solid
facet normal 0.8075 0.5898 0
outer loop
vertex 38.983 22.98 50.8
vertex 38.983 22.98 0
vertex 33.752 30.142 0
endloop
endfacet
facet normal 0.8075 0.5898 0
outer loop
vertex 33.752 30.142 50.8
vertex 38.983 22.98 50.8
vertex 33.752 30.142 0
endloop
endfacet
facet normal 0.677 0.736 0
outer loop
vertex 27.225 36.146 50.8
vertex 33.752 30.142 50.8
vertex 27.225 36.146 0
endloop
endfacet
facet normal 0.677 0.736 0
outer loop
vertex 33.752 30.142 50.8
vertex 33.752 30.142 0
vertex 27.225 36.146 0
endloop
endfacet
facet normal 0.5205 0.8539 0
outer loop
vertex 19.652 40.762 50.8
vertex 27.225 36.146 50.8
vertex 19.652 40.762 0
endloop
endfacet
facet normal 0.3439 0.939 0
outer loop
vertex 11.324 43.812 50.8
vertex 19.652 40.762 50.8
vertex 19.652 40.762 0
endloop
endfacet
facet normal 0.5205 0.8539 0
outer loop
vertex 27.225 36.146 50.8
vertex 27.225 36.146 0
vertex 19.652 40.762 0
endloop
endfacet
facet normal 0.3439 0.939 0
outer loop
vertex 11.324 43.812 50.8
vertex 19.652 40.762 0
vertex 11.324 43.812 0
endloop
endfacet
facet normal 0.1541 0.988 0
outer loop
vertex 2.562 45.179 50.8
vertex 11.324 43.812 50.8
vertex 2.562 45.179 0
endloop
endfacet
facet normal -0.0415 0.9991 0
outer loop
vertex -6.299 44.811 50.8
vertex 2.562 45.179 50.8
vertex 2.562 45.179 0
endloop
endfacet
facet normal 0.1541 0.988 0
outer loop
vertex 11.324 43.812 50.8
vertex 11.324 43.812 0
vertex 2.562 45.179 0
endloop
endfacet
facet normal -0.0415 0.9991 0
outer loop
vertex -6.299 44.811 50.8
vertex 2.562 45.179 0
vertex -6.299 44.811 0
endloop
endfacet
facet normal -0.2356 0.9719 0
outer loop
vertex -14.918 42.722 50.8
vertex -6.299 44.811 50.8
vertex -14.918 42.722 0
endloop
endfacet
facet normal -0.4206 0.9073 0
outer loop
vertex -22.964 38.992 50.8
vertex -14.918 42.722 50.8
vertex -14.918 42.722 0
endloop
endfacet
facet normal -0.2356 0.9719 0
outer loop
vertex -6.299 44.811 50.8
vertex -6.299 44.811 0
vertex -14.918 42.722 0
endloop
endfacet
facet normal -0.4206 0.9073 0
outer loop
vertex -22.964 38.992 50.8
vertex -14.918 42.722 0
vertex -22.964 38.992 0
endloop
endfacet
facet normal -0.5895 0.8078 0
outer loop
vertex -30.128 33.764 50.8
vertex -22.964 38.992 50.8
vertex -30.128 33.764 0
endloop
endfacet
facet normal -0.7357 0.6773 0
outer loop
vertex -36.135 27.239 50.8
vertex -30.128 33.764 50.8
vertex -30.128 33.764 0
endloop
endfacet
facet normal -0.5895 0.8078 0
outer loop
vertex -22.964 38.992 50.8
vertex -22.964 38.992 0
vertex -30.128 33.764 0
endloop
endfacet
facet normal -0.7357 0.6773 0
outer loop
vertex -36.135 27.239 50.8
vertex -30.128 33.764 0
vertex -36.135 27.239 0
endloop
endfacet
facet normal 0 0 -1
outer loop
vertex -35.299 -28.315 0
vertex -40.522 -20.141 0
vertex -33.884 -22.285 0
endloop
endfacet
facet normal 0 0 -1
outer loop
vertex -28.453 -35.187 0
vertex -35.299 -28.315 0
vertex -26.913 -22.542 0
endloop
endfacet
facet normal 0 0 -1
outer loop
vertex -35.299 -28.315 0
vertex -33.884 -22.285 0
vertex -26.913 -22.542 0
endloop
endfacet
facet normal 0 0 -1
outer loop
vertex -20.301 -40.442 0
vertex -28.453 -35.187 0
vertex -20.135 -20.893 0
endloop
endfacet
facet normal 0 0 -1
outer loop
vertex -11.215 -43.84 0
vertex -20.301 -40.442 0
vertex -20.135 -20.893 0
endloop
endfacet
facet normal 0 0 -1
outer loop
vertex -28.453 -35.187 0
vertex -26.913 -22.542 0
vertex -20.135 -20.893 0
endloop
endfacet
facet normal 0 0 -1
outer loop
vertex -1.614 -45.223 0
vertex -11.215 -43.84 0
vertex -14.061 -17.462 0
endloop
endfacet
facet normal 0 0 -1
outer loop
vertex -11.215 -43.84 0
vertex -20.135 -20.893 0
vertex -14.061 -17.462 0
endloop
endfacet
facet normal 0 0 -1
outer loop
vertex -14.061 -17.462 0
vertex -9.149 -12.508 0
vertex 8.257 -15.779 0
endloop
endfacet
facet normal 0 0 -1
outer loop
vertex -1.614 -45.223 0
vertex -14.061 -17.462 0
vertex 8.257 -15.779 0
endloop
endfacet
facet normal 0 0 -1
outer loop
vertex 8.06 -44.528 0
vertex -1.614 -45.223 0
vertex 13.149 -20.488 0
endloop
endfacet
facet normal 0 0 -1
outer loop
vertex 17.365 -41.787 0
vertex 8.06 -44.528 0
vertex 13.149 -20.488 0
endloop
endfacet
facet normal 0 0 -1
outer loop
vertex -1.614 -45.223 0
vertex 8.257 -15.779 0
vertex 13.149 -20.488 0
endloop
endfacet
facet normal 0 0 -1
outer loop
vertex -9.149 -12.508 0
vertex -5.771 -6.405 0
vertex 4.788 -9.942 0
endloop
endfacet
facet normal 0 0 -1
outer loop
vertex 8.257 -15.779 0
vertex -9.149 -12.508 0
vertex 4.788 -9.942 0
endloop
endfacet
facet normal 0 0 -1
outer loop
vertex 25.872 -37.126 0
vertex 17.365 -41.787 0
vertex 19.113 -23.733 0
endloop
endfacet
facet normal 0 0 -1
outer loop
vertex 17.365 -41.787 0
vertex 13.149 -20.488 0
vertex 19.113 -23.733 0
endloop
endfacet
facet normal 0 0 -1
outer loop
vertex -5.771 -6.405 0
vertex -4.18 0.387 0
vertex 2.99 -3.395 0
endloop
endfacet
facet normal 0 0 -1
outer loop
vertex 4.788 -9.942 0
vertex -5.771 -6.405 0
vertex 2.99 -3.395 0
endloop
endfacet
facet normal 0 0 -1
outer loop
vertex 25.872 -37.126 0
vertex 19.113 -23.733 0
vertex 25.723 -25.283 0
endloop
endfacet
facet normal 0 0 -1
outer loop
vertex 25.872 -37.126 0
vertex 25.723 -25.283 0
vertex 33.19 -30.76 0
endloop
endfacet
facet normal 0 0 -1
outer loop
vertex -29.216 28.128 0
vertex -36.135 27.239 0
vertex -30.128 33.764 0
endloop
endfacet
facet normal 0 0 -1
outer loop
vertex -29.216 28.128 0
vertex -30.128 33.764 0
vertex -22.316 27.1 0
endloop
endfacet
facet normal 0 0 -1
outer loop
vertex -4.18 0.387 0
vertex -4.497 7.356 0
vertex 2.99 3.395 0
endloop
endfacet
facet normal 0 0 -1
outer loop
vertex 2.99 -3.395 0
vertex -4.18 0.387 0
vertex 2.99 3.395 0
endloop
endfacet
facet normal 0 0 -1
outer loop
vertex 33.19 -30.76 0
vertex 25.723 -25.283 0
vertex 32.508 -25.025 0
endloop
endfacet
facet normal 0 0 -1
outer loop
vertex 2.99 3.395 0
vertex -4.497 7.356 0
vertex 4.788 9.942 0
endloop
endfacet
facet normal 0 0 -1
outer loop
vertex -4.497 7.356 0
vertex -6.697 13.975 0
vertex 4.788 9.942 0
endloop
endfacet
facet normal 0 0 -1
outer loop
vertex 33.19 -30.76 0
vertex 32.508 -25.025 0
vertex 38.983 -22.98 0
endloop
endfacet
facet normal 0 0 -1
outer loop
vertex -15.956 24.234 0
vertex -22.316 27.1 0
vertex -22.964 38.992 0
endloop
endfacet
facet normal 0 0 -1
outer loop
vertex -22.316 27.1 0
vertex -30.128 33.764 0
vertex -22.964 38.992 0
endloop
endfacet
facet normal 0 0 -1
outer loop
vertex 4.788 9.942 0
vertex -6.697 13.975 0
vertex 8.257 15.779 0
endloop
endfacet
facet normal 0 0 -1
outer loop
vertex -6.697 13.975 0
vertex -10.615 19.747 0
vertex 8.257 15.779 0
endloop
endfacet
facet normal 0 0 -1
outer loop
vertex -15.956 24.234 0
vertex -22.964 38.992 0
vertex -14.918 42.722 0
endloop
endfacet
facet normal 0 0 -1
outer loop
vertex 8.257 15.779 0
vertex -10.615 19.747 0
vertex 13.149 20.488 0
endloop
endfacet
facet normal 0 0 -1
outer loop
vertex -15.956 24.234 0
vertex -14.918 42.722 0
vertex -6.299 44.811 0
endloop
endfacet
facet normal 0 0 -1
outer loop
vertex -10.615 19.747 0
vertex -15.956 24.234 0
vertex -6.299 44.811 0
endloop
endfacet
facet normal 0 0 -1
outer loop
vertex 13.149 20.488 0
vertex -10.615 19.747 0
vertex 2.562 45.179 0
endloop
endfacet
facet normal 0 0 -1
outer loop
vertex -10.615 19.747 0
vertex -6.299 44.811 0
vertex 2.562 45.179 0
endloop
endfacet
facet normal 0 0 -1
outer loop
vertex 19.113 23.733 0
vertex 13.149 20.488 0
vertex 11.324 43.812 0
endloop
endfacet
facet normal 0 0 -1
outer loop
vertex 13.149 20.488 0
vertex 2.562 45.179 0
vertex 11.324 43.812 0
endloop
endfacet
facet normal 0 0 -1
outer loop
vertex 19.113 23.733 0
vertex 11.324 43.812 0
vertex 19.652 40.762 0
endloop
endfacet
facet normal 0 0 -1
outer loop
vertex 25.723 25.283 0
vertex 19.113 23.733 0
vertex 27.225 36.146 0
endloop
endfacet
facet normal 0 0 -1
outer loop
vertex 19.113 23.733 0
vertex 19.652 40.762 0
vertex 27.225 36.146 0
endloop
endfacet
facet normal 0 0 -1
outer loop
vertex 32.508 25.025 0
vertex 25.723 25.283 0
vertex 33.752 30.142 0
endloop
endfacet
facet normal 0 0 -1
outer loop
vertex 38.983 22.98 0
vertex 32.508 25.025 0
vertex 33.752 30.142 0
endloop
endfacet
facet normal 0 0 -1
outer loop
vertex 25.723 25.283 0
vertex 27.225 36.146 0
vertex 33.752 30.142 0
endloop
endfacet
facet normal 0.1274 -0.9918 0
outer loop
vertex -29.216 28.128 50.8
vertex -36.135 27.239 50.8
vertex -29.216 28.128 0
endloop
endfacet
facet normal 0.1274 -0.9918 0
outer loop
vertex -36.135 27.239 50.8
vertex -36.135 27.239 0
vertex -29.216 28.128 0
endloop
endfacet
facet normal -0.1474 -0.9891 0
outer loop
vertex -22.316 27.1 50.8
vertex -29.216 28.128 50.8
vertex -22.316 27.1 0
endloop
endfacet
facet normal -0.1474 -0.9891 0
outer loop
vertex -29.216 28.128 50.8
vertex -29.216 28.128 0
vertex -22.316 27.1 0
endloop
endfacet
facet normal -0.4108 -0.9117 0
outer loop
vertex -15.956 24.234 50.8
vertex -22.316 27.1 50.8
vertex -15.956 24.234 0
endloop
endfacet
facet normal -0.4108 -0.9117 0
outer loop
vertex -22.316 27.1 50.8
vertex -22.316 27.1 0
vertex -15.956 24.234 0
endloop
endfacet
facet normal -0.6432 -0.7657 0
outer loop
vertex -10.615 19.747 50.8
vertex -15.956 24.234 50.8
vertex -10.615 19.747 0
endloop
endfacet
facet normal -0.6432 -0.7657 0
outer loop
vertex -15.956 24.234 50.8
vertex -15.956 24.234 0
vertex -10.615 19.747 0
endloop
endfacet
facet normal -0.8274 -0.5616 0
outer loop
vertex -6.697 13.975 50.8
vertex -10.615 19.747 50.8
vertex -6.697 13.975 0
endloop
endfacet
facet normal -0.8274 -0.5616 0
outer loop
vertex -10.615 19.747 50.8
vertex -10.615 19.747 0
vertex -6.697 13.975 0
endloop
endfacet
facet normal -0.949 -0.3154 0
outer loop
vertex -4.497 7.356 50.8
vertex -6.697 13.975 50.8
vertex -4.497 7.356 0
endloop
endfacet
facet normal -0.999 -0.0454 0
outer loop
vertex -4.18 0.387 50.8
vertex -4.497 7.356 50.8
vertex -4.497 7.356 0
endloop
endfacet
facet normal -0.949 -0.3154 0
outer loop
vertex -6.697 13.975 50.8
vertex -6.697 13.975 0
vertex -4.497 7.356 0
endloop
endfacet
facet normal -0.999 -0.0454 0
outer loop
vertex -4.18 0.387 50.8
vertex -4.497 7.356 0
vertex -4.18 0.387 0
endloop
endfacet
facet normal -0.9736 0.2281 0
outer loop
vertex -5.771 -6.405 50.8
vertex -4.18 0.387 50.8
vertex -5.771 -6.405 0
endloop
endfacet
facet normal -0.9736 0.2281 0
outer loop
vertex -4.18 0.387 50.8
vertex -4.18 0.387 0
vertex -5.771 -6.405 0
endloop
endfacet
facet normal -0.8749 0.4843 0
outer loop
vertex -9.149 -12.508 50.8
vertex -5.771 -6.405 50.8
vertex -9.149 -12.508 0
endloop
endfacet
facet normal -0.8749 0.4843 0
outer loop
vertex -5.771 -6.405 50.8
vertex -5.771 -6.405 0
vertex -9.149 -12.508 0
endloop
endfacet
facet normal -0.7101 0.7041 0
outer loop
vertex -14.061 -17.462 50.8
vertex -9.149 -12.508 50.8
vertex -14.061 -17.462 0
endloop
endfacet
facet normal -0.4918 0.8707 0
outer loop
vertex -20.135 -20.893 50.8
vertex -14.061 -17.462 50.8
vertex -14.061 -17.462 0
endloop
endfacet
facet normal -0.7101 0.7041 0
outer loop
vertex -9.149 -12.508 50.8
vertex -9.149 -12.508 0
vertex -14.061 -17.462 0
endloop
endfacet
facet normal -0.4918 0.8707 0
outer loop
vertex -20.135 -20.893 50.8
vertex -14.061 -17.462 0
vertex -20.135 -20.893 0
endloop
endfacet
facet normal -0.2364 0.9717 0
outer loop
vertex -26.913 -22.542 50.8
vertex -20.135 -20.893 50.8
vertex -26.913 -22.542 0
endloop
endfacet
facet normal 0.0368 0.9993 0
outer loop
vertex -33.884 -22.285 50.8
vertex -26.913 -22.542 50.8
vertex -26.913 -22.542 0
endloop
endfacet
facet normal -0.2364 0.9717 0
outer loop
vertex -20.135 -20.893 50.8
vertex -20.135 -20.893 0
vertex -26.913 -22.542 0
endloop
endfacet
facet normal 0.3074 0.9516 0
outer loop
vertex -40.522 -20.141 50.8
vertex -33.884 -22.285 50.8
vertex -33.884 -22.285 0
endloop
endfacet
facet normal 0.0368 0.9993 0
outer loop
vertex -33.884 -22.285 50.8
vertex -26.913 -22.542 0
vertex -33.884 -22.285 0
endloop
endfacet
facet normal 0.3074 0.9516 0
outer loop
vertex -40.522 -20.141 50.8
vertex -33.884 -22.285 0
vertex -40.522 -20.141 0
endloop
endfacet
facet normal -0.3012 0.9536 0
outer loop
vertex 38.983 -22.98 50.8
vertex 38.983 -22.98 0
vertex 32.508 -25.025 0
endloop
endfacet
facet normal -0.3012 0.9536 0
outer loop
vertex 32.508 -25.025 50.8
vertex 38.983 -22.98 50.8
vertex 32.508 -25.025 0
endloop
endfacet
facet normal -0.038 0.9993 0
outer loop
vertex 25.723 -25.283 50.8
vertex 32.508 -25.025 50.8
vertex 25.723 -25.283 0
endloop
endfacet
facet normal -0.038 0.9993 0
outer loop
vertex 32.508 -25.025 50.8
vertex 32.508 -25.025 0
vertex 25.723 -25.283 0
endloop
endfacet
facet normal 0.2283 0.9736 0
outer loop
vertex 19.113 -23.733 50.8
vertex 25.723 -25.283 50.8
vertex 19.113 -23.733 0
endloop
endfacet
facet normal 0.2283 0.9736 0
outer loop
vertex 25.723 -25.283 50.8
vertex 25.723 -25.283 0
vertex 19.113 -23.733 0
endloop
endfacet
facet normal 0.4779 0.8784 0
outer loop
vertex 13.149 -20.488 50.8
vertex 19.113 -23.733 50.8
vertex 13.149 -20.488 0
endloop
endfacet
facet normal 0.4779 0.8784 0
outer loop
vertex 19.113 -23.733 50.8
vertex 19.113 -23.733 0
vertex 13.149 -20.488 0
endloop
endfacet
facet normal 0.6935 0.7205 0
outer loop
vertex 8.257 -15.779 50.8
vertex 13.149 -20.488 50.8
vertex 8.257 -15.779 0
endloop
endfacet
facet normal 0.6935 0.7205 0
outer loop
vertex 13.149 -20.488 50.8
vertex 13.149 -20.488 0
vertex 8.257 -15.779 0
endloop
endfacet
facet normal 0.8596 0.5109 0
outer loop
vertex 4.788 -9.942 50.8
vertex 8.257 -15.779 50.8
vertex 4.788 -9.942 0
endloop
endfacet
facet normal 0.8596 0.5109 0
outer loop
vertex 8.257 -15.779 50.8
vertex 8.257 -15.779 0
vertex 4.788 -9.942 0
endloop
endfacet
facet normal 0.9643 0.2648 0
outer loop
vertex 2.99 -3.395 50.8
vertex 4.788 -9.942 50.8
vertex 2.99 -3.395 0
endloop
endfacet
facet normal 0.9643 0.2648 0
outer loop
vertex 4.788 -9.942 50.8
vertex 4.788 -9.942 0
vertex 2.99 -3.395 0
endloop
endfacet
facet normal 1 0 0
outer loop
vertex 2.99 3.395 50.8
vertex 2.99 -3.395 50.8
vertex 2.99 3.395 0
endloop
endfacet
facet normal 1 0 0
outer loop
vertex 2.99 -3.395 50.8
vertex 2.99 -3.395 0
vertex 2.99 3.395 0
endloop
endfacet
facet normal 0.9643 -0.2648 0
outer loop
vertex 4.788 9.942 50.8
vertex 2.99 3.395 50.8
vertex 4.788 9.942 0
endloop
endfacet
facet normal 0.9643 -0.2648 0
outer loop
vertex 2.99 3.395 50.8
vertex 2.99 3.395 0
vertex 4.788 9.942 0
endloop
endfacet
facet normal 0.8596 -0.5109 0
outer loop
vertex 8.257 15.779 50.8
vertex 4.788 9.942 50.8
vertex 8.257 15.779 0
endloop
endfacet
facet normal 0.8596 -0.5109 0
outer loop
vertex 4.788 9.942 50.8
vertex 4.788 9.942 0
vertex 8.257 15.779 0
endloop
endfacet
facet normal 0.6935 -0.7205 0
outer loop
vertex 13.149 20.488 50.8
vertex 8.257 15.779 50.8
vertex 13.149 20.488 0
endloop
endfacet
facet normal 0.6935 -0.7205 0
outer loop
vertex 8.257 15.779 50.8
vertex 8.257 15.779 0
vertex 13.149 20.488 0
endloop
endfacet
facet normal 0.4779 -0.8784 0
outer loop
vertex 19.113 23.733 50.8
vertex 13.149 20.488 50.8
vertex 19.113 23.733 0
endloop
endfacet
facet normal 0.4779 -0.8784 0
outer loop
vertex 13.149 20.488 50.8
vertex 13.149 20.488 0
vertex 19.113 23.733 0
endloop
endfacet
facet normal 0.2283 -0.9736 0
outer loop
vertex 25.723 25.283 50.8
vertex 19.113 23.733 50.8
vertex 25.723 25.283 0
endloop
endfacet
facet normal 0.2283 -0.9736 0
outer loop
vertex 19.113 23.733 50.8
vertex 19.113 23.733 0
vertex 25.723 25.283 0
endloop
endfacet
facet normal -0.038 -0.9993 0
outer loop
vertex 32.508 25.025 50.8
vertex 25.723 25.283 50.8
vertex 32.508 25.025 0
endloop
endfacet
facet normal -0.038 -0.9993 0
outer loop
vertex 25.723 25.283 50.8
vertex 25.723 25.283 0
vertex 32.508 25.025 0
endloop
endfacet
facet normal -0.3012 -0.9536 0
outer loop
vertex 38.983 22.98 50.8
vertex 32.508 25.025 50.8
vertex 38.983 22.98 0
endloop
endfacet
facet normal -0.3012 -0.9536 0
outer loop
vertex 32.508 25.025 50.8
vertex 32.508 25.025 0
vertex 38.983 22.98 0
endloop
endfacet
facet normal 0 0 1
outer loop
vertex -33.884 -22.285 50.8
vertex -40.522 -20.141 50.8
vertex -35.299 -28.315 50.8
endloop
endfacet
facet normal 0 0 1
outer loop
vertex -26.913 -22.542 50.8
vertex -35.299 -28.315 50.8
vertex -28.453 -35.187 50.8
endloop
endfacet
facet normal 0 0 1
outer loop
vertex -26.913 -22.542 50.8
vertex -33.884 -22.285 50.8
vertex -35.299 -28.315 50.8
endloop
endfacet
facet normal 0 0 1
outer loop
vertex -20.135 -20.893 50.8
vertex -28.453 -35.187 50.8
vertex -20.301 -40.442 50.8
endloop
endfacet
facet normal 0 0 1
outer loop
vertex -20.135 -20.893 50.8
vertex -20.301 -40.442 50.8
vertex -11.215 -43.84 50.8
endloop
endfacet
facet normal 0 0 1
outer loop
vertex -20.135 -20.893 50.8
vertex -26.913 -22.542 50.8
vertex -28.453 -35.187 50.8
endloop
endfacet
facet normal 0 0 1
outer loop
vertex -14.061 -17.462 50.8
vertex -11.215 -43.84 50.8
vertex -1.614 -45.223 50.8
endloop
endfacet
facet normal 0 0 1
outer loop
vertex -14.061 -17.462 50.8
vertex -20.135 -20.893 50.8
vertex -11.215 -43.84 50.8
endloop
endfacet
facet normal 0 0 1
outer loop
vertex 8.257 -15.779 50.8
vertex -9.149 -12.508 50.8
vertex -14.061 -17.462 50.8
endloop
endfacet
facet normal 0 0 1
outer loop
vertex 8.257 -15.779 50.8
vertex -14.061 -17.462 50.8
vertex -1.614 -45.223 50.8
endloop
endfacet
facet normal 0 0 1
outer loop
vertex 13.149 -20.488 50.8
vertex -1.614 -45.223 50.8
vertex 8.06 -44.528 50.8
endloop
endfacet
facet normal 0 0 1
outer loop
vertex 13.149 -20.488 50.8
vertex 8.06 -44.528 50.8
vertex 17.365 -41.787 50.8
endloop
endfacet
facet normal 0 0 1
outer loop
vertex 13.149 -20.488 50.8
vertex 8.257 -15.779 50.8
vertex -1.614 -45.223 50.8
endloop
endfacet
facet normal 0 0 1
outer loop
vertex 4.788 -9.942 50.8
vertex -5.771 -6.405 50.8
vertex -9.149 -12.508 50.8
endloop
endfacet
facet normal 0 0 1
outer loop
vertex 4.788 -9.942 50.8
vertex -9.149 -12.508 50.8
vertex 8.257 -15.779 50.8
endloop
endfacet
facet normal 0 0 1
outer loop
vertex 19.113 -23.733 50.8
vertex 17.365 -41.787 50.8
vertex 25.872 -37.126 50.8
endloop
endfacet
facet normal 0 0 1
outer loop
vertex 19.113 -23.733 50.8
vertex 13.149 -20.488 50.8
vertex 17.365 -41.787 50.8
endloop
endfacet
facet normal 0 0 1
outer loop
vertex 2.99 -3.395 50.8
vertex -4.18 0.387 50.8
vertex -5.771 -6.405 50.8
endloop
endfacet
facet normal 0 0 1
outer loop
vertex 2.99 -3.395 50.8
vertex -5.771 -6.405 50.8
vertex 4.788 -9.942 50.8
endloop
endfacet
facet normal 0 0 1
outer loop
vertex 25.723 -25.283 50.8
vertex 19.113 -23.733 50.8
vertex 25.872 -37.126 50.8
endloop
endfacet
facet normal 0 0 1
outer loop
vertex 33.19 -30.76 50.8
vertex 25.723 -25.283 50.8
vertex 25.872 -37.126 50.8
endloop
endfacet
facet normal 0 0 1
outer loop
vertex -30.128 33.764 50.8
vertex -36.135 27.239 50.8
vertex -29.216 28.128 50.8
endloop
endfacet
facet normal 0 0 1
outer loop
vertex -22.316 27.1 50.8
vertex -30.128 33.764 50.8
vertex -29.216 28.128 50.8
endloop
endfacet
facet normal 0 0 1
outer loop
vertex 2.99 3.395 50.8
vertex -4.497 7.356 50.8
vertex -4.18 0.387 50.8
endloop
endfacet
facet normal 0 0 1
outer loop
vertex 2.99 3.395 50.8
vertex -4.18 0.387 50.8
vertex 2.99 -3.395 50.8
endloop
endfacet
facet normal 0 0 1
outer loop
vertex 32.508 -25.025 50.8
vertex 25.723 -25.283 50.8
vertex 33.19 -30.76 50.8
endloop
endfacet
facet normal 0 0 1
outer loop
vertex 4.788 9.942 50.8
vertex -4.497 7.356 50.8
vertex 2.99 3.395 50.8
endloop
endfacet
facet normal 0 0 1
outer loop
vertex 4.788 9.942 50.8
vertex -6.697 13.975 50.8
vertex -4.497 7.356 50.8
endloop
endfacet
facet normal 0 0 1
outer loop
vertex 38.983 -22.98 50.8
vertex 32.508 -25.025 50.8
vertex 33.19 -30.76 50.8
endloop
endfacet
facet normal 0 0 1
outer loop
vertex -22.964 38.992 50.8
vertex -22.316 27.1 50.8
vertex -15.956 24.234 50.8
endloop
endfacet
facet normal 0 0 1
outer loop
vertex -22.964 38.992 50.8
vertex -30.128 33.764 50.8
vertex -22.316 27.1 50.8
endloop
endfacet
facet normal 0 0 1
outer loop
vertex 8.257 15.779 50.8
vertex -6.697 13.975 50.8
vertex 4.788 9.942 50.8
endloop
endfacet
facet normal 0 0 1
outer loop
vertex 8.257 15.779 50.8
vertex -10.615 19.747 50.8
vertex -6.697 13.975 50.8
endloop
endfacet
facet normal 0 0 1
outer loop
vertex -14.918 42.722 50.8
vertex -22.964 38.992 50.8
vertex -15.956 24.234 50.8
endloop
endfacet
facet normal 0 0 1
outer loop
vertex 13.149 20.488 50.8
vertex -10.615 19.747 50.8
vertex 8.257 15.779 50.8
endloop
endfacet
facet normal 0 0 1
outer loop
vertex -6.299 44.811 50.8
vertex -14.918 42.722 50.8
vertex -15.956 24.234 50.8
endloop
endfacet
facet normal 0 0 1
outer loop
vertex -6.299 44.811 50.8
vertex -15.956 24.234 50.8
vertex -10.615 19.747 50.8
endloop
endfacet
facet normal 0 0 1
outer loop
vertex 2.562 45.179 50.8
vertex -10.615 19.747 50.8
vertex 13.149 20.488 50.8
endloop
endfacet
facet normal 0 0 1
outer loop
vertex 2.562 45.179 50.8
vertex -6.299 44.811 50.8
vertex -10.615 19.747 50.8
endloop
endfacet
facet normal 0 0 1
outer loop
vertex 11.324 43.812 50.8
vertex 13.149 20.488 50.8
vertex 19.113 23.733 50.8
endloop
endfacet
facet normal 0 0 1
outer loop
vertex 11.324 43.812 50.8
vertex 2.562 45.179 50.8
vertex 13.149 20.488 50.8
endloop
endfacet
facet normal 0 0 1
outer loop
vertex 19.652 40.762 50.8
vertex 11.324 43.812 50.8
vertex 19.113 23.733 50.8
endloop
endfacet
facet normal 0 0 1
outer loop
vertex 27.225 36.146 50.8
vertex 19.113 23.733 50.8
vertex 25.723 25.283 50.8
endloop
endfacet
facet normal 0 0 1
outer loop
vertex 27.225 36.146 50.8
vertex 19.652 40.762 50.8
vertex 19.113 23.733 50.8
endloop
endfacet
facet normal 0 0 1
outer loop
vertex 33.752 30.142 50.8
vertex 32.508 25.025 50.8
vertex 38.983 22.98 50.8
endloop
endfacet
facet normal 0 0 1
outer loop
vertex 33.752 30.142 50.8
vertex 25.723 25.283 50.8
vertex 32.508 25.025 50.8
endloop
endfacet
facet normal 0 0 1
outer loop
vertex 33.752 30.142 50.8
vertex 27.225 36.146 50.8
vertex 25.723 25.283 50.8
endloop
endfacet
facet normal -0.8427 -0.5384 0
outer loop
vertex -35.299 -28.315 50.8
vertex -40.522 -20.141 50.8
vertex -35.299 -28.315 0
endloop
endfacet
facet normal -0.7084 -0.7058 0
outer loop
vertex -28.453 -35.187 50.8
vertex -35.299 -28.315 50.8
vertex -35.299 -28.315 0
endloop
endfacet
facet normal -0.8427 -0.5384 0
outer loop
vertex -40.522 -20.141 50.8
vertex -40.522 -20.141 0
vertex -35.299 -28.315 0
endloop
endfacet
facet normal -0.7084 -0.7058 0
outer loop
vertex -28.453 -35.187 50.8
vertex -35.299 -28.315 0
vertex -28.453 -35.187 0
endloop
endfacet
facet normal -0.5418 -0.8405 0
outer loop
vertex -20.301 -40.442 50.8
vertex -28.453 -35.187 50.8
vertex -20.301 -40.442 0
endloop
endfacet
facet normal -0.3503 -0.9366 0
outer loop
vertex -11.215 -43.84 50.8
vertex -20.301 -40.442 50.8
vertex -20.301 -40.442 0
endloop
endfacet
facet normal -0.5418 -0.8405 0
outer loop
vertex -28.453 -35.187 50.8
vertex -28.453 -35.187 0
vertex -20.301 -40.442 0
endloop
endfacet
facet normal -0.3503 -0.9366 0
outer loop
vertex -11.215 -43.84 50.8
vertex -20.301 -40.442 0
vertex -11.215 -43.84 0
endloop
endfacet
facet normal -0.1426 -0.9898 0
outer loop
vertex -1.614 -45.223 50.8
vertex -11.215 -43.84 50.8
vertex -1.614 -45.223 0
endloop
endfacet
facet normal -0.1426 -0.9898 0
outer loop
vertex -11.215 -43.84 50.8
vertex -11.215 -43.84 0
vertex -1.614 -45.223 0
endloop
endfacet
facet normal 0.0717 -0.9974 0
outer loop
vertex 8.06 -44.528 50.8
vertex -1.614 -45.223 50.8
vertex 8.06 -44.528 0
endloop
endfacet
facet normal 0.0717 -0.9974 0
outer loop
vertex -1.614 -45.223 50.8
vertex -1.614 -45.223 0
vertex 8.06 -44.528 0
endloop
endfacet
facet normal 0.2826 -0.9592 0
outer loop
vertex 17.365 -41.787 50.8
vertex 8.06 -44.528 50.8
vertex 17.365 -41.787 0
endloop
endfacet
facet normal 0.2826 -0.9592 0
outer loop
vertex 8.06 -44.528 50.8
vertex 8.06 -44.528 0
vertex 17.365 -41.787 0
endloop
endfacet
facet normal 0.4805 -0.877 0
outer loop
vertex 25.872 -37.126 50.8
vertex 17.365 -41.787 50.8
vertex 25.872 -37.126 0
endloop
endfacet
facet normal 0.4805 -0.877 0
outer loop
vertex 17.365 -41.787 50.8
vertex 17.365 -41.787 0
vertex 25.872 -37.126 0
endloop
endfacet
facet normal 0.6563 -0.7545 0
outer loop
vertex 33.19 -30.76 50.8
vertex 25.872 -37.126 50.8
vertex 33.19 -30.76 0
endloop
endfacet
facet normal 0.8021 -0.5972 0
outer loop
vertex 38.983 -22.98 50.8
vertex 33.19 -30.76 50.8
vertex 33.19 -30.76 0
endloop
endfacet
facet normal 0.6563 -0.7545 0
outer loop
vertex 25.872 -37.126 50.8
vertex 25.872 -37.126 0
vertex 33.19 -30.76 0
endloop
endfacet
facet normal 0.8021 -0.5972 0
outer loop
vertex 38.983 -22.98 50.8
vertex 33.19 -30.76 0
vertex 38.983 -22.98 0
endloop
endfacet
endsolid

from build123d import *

# Parameters (mm, degrees)
F0_R      = 45.251608
F1_DEPTH  = 25.4
F1_FACE_R = 45.251608
F2_DEPTH  = 25.4
F4_D      = 50.8


with BuildPart() as f1:
    # F0 (on Top) → F1 (new body)
    with BuildSketch(Plane.XY):
        Circle(F0_R)
    extrude(amount=F1_DEPTH)

    # F1_face (on face) → F2 (join)
    with BuildSketch(Plane.XY.offset(25.4)):
        Circle(F1_FACE_R)
    extrude(amount=F2_DEPTH)

    # F4 (through all)
    with Locations(Plane.XY.offset(50.8)):
        with Locations((-29.471625, 2.728854), (28.161775, 0)):
            Hole(F4_D / 2)


solid = f1.part
